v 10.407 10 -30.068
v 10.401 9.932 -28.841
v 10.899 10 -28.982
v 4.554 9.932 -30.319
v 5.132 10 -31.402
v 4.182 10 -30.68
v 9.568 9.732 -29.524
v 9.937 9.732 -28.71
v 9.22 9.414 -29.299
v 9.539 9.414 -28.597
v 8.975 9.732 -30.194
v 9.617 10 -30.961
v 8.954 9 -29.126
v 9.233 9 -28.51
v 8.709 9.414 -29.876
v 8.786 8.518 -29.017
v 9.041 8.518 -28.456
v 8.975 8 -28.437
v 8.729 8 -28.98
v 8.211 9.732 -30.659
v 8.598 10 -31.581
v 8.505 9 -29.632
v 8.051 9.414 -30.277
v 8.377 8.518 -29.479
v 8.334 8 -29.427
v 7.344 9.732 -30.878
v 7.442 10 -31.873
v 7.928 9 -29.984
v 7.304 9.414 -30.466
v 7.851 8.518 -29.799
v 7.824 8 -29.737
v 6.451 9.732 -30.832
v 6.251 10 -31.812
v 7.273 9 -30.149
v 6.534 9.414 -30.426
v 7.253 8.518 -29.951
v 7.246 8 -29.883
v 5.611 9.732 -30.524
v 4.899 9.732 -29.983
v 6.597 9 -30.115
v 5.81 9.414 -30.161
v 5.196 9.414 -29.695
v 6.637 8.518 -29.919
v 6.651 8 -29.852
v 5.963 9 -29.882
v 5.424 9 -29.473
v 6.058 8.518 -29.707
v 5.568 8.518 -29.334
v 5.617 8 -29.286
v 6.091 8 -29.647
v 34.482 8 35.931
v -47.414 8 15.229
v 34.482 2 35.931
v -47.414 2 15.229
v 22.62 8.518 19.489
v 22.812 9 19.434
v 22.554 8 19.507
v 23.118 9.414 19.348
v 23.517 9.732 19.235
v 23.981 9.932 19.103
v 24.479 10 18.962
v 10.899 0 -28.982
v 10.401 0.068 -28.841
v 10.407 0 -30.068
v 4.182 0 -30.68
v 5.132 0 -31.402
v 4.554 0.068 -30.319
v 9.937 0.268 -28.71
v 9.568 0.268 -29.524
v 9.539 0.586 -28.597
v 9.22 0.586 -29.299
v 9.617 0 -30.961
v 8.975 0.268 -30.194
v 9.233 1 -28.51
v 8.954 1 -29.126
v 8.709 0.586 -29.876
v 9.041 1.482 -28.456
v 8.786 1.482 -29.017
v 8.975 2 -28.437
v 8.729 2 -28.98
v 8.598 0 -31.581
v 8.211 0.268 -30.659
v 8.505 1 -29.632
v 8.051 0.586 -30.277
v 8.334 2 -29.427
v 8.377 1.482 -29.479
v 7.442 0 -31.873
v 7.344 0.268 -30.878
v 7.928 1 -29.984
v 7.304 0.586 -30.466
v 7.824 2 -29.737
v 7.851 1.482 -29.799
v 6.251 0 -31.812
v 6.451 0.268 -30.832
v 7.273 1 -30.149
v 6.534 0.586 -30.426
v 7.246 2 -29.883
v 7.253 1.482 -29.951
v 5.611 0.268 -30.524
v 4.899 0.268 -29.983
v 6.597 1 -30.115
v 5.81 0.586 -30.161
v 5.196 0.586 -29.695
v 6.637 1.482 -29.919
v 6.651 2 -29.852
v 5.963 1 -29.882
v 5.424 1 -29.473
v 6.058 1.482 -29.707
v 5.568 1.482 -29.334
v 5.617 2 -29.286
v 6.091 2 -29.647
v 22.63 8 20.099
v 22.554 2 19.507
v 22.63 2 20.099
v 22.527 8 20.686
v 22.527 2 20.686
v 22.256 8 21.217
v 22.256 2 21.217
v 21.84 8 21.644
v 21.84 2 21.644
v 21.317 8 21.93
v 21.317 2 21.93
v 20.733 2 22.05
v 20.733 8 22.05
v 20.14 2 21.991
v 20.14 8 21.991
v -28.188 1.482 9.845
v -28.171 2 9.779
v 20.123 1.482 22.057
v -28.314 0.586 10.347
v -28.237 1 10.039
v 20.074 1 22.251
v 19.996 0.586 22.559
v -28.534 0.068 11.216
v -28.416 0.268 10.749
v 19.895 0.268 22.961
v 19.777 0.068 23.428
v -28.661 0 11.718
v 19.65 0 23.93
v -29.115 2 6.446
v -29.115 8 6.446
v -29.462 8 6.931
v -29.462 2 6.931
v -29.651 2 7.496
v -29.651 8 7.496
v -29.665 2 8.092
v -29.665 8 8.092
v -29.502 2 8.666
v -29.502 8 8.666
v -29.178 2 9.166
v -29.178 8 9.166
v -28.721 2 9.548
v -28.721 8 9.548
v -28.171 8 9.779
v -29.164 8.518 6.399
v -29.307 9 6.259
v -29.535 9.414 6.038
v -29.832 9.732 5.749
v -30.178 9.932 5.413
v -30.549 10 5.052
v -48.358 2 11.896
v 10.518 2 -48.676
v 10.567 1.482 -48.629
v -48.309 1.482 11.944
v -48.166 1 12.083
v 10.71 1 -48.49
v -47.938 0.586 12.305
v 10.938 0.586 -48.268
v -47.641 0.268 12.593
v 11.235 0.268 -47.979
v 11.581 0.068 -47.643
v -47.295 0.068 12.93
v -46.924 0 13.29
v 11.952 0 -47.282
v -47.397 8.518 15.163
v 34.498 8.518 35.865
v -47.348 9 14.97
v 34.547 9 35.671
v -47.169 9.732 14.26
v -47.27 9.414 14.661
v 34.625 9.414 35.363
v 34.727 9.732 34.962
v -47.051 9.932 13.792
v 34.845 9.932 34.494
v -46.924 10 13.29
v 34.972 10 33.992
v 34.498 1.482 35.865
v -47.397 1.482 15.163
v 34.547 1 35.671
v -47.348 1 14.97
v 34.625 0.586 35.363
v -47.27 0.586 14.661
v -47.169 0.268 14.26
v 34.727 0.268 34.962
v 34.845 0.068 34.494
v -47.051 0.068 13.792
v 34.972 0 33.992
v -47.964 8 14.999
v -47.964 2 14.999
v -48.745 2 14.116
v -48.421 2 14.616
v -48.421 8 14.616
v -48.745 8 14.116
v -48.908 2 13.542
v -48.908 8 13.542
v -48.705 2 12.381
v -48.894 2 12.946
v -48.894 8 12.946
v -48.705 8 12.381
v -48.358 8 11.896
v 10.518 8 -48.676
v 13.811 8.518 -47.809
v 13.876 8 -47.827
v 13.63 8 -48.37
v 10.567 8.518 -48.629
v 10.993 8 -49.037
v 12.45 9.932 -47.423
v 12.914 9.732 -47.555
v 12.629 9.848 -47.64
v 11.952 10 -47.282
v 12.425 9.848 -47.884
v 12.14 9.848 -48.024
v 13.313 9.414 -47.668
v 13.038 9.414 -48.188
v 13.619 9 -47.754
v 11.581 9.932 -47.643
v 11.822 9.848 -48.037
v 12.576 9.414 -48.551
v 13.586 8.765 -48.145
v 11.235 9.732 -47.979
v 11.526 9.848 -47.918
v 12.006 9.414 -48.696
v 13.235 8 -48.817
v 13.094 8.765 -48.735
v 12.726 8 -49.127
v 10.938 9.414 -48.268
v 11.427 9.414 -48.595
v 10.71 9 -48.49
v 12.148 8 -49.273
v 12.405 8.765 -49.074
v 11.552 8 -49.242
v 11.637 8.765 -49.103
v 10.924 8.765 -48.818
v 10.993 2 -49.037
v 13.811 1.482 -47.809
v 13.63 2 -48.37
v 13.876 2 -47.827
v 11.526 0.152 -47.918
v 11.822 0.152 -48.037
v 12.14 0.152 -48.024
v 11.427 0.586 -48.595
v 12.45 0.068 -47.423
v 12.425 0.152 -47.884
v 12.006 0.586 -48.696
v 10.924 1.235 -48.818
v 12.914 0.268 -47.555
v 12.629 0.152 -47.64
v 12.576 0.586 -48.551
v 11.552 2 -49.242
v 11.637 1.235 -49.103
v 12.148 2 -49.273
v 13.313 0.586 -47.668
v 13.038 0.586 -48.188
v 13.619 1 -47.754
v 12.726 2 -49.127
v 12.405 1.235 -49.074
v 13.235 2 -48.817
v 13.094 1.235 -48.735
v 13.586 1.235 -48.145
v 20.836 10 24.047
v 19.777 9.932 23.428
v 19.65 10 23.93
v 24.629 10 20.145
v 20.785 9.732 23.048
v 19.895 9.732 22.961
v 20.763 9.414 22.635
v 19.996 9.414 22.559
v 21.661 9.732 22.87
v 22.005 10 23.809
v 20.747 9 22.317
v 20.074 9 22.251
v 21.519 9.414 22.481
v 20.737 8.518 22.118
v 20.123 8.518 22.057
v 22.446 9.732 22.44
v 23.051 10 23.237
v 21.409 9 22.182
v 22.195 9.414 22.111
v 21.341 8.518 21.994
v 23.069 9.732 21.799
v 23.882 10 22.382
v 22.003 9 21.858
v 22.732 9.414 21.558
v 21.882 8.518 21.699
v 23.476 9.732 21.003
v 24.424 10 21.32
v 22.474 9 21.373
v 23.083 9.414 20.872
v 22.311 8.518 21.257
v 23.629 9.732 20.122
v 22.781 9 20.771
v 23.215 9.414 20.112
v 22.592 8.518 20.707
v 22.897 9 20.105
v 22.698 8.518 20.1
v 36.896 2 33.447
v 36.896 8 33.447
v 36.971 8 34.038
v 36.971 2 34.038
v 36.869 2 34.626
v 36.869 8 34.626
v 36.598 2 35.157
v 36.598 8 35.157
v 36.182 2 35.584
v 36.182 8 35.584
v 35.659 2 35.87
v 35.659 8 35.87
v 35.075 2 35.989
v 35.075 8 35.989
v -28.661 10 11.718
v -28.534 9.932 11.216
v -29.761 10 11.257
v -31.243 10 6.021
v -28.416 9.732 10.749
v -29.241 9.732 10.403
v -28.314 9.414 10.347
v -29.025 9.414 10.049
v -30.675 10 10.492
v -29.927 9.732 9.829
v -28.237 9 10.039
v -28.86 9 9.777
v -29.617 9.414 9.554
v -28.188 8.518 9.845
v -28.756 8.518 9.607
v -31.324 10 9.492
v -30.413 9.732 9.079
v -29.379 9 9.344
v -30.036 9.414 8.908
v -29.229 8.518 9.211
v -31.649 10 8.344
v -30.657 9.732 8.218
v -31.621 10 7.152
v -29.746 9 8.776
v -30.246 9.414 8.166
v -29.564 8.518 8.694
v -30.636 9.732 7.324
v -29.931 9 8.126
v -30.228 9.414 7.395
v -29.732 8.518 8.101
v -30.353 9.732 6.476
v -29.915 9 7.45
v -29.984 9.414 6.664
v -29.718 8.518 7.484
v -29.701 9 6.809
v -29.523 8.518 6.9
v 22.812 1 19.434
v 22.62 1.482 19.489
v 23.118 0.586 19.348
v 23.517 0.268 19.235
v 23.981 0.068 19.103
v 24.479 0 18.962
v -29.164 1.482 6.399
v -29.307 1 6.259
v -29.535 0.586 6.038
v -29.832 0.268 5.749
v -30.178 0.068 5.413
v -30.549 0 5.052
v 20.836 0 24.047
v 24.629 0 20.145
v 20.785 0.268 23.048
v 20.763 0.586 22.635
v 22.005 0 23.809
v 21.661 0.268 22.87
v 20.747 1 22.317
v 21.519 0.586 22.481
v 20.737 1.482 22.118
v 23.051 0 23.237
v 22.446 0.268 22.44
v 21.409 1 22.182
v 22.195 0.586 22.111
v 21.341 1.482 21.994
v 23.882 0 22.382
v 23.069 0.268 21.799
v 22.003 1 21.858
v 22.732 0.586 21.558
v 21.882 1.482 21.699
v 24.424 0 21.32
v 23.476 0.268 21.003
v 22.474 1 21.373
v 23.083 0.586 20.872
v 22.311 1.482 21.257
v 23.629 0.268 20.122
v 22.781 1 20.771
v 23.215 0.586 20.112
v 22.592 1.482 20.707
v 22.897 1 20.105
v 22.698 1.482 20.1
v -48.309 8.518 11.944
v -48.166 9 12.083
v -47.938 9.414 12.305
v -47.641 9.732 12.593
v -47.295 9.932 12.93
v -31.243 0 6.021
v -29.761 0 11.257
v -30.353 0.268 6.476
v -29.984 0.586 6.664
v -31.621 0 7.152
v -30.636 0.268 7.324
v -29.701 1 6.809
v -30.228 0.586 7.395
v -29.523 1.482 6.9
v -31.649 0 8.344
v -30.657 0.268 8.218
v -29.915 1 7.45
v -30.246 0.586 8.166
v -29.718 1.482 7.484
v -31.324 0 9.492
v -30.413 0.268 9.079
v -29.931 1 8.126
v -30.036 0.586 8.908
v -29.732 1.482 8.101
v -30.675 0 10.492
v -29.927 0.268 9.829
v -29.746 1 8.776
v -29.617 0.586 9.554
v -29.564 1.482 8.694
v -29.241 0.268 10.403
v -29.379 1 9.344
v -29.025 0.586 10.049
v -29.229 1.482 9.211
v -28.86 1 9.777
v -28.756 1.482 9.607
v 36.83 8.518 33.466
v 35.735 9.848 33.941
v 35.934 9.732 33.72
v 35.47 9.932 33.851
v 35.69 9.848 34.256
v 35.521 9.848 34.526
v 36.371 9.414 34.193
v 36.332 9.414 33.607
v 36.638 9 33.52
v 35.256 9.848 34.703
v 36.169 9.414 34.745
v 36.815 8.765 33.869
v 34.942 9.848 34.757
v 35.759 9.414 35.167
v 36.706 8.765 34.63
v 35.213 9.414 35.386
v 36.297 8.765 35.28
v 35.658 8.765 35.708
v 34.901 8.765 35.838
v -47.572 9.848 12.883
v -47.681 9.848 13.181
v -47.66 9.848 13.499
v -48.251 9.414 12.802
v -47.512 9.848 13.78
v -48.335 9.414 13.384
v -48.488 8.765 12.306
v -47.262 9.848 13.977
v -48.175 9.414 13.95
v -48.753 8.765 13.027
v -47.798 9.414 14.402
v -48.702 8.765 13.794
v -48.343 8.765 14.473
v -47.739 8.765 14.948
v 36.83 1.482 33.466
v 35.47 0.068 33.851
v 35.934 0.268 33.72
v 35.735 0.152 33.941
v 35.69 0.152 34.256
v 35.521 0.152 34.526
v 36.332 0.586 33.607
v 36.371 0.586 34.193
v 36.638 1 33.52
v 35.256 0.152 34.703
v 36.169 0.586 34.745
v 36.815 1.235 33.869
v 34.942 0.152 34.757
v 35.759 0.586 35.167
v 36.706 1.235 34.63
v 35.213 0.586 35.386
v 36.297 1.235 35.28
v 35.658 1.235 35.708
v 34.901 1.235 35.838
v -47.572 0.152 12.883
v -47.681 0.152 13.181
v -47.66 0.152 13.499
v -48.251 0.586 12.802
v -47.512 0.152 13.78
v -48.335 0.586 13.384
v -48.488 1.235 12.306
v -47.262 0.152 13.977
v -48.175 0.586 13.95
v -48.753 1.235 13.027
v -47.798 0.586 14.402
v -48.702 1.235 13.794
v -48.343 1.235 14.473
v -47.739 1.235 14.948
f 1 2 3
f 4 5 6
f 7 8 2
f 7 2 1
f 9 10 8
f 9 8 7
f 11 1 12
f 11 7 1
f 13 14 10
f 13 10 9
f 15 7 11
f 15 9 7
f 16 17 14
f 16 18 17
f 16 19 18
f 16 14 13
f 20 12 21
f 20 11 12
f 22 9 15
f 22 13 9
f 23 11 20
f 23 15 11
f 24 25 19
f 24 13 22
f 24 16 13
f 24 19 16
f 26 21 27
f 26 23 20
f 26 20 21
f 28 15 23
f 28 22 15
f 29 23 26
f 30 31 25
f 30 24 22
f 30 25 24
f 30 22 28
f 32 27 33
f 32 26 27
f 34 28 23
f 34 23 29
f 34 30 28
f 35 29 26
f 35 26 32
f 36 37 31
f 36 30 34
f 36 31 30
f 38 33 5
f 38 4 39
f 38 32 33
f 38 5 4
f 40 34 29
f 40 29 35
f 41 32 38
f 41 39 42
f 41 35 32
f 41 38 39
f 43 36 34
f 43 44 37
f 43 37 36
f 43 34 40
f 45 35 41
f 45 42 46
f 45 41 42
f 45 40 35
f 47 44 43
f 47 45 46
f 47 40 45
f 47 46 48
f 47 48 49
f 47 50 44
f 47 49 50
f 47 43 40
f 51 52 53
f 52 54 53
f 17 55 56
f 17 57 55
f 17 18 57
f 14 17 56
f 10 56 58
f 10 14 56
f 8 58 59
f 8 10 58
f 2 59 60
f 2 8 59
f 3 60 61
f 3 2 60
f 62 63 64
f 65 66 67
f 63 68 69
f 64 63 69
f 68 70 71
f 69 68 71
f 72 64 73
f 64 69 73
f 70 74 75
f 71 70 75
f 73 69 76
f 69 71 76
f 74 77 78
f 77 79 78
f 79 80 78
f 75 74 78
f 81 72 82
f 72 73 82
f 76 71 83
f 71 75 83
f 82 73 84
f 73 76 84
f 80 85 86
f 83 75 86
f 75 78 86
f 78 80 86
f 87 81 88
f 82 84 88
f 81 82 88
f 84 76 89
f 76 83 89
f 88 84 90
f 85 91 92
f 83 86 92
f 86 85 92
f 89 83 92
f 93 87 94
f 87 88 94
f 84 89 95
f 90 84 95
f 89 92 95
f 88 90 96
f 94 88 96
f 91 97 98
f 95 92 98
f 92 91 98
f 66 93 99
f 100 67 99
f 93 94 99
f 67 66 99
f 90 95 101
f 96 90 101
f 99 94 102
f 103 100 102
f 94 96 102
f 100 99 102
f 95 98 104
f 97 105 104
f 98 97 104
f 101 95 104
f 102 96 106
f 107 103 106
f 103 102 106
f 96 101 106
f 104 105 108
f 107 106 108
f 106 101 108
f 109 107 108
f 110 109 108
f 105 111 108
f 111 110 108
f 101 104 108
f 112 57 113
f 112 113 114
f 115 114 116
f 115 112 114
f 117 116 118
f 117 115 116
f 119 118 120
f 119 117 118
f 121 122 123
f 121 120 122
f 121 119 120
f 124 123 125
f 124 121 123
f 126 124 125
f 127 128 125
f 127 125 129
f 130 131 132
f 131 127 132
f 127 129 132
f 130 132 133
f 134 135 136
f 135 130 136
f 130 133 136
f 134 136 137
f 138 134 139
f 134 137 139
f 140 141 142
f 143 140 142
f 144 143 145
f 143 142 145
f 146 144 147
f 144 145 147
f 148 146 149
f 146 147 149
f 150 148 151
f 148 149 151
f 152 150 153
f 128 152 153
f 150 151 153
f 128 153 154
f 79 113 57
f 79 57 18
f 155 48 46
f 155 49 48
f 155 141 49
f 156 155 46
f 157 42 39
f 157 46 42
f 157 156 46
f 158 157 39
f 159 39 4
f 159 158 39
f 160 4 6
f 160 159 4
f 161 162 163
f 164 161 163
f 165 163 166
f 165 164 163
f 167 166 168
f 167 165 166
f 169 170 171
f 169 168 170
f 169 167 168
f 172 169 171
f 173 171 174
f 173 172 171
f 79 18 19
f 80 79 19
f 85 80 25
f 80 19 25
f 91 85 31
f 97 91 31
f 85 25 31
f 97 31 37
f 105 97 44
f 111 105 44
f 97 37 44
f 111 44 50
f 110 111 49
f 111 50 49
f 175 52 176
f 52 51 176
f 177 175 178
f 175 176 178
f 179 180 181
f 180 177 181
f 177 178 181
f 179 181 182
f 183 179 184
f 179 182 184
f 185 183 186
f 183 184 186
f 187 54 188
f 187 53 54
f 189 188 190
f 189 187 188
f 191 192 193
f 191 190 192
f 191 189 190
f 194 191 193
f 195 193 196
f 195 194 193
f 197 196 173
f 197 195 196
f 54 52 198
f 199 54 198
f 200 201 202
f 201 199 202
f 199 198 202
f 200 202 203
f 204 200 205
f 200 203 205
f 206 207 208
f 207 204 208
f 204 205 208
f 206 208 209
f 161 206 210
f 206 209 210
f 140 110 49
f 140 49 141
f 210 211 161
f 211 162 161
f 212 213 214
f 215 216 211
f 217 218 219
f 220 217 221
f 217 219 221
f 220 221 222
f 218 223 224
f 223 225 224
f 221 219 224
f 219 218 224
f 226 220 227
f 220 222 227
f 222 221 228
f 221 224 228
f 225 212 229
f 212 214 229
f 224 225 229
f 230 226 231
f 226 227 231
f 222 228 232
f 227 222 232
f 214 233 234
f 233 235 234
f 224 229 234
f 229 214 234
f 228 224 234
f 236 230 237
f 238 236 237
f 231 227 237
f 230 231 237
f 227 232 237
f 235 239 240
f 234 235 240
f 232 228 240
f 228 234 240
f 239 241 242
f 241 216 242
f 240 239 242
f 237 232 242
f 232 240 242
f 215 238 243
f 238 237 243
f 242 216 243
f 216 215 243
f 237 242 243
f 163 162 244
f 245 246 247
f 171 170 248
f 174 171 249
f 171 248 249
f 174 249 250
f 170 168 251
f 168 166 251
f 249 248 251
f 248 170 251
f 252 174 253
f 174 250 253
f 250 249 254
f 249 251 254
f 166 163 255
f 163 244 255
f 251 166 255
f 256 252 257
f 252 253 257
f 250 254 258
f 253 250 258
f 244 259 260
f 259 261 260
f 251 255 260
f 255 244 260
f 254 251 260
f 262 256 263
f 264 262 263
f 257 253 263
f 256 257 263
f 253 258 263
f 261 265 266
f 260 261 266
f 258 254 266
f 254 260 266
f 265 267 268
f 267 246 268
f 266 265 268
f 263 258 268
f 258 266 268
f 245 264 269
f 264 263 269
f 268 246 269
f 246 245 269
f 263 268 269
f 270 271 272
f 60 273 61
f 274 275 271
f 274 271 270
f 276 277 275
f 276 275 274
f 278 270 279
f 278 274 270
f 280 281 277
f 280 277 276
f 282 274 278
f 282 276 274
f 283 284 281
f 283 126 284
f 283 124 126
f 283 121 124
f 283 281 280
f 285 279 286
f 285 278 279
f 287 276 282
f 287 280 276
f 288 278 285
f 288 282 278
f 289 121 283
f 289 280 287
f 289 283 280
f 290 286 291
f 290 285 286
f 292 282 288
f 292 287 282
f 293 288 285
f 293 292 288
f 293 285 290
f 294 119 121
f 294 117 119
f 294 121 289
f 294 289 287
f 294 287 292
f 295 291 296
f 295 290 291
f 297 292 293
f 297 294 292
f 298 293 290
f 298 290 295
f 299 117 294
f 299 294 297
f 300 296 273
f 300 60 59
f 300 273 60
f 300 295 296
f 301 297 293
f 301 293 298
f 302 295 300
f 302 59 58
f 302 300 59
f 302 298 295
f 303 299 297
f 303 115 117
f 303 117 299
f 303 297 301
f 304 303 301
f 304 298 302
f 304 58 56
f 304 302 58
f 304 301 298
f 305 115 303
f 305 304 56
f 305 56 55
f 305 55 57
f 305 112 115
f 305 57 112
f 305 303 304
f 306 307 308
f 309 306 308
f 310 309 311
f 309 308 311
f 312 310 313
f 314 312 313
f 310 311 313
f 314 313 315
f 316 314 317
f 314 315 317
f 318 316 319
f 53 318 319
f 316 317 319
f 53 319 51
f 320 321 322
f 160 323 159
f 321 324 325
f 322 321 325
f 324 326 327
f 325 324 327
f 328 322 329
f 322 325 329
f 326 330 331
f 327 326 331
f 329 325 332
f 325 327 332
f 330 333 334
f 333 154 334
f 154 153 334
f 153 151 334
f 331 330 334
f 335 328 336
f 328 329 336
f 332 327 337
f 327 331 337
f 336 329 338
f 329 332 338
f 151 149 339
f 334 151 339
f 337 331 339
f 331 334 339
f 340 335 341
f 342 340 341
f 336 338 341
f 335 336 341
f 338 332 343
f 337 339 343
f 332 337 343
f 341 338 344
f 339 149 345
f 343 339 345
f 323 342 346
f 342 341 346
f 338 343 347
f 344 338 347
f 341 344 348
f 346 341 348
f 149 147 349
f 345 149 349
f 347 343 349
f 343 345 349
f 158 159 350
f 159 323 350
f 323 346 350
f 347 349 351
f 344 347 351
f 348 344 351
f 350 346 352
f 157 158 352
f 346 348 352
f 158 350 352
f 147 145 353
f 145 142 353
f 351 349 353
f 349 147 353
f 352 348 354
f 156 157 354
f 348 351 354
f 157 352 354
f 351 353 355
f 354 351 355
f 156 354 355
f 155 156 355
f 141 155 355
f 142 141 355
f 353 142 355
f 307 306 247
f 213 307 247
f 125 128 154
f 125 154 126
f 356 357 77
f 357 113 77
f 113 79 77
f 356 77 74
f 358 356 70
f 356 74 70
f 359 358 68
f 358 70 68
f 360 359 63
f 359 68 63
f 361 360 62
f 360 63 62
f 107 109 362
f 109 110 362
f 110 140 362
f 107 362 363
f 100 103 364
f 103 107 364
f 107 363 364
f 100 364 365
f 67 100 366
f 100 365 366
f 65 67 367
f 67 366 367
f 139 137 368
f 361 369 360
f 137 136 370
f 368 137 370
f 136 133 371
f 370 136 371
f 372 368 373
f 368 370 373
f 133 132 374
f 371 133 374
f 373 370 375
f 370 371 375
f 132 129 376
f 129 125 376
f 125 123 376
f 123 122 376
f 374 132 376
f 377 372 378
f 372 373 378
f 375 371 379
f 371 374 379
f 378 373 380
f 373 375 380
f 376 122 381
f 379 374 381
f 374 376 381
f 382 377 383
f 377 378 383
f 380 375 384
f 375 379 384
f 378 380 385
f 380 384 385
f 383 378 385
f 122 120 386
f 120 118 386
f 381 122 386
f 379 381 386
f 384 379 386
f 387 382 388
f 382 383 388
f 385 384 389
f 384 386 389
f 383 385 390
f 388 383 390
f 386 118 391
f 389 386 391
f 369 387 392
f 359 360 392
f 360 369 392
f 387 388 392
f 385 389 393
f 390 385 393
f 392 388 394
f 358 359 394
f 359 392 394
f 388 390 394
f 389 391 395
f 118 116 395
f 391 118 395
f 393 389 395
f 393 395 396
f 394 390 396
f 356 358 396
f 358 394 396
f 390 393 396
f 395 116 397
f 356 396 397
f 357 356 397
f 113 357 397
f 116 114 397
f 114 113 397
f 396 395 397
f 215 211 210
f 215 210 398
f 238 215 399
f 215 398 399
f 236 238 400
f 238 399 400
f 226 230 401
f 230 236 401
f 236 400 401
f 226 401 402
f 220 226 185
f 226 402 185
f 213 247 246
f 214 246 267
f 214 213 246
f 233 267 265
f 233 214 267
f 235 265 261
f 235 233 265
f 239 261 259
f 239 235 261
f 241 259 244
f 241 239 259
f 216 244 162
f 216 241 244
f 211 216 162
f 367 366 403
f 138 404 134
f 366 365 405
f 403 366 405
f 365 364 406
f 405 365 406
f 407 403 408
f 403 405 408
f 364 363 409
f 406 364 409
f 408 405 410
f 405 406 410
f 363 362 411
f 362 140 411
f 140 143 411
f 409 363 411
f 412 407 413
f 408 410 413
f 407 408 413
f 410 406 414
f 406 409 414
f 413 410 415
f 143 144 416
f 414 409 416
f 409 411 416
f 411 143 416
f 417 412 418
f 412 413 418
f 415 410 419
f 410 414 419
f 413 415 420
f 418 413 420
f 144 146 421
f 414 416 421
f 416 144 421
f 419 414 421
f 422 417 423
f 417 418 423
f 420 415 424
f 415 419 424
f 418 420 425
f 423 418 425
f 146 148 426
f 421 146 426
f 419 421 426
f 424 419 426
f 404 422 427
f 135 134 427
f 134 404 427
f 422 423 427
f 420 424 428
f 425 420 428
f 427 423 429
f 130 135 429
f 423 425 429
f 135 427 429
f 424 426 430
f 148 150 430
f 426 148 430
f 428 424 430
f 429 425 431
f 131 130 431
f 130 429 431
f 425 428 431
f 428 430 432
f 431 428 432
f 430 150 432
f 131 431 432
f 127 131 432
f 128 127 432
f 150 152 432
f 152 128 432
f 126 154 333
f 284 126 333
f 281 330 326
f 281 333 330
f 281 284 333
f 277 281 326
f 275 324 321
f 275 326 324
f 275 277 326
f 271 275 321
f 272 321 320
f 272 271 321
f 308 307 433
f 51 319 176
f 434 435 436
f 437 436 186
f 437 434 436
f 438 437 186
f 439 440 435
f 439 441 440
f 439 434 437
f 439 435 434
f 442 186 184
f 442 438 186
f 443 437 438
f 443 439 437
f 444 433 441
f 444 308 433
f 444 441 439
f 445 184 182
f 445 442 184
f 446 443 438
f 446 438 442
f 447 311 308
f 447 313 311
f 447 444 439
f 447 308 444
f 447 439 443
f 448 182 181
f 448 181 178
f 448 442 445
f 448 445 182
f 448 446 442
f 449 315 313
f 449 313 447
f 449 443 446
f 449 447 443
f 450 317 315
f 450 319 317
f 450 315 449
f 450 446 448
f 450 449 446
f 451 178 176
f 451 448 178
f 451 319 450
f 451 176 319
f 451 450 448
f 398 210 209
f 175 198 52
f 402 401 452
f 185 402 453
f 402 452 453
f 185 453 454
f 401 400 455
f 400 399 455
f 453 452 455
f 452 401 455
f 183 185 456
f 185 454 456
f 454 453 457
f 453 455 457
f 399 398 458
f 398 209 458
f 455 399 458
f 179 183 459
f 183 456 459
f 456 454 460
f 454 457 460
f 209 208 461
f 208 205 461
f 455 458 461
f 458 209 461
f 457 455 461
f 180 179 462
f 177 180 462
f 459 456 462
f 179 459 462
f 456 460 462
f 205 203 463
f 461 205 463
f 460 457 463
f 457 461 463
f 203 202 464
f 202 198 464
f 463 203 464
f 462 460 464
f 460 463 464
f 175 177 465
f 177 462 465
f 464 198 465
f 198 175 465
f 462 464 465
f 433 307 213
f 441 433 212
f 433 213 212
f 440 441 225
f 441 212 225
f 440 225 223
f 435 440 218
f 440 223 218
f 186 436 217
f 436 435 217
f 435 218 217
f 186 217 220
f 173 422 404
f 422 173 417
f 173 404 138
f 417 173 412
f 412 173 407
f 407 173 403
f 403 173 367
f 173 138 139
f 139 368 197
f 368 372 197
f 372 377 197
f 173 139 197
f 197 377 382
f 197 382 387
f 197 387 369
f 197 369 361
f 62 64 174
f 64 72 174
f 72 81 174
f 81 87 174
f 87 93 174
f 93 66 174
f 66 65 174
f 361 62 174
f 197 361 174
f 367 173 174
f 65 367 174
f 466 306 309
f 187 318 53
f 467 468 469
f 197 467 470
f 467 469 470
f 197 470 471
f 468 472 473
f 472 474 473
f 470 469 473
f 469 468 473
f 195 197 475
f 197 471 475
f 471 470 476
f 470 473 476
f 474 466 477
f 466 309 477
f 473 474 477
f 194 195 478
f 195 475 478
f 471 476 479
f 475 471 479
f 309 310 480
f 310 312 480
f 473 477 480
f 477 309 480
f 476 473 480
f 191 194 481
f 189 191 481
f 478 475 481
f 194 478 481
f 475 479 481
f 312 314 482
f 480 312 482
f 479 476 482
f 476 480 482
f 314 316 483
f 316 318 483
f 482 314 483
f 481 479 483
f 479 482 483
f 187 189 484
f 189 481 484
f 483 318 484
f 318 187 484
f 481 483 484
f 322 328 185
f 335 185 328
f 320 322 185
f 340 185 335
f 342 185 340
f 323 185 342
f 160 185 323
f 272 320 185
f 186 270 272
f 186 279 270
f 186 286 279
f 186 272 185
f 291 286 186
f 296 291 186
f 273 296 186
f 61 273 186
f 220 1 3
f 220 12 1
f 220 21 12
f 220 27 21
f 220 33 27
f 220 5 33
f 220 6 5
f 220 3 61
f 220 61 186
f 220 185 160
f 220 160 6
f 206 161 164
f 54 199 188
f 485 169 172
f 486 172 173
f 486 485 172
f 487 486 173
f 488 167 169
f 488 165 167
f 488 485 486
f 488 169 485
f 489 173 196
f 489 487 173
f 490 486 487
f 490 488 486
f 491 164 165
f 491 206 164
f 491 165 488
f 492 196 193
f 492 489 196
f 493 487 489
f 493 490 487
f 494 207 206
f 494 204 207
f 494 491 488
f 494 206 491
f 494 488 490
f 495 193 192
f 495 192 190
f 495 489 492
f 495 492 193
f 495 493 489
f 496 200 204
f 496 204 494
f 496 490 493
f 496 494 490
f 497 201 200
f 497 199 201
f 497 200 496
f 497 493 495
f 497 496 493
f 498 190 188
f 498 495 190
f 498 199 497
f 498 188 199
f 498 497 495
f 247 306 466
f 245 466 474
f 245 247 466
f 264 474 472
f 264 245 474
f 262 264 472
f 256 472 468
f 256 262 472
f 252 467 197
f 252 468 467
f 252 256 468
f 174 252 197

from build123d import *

# Parameters (mm, degrees)
EXTRUDE1_DEPTH = 10
FILLET1_R      = 2


with BuildPart() as part:
    # Sketch1 → Extrude1 (new body)
    with BuildSketch(Plane(origin=(0, 0, 0), x_dir=(1, 0, 0), z_dir=(0, 1, 0))):
        Polygon((37.839987617, -36.780043986), (12.932458636, 51.160412548), (-50.772446253, -14.380368562), align=None)
        Polygon((23.498416155, -22.840197215), (8.030982938, 31.770323946), (-31.529399093, -8.930126731), align=None, mode=Mode.SUBTRACT)
    extrude(amount=EXTRUDE1_DEPTH)

    # Fillet1
    fillet1_edges = [part.edges().sort_by_distance(p)[0] for p in [
        (-18.919993808, 10, -18.390021993),
        (-4.015491469, 0, 15.885161973),
        (-31.529399093, 5, 8.930126731),
        (15.764699546, 0, -4.465063366),
        (23.498416155, 5, 22.840197215),
        (-11.749208077, 0, -11.420098607),
        (8.030982938, 5, -31.770323946),
        (-4.015491469, 10, 15.885161973),
        (15.764699546, 10, -4.465063366),
        (-11.749208077, 10, -11.420098607),
        (-18.919993808, 0, -18.390021993),
        (-6.466229318, 10, 25.580206274),
        (25.386223126, 0, -7.190184281),
        (-6.466229318, 0, 25.580206274),
        (-50.772446253, 5, 14.380368562),
        (12.932458636, 5, -51.160412548),
        (37.839987617, 5, 36.780043986),
        (25.386223126, 10, -7.190184281),
    ]]
    fillet(fillet1_edges, radius=FILLET1_R)


solid = part.part
